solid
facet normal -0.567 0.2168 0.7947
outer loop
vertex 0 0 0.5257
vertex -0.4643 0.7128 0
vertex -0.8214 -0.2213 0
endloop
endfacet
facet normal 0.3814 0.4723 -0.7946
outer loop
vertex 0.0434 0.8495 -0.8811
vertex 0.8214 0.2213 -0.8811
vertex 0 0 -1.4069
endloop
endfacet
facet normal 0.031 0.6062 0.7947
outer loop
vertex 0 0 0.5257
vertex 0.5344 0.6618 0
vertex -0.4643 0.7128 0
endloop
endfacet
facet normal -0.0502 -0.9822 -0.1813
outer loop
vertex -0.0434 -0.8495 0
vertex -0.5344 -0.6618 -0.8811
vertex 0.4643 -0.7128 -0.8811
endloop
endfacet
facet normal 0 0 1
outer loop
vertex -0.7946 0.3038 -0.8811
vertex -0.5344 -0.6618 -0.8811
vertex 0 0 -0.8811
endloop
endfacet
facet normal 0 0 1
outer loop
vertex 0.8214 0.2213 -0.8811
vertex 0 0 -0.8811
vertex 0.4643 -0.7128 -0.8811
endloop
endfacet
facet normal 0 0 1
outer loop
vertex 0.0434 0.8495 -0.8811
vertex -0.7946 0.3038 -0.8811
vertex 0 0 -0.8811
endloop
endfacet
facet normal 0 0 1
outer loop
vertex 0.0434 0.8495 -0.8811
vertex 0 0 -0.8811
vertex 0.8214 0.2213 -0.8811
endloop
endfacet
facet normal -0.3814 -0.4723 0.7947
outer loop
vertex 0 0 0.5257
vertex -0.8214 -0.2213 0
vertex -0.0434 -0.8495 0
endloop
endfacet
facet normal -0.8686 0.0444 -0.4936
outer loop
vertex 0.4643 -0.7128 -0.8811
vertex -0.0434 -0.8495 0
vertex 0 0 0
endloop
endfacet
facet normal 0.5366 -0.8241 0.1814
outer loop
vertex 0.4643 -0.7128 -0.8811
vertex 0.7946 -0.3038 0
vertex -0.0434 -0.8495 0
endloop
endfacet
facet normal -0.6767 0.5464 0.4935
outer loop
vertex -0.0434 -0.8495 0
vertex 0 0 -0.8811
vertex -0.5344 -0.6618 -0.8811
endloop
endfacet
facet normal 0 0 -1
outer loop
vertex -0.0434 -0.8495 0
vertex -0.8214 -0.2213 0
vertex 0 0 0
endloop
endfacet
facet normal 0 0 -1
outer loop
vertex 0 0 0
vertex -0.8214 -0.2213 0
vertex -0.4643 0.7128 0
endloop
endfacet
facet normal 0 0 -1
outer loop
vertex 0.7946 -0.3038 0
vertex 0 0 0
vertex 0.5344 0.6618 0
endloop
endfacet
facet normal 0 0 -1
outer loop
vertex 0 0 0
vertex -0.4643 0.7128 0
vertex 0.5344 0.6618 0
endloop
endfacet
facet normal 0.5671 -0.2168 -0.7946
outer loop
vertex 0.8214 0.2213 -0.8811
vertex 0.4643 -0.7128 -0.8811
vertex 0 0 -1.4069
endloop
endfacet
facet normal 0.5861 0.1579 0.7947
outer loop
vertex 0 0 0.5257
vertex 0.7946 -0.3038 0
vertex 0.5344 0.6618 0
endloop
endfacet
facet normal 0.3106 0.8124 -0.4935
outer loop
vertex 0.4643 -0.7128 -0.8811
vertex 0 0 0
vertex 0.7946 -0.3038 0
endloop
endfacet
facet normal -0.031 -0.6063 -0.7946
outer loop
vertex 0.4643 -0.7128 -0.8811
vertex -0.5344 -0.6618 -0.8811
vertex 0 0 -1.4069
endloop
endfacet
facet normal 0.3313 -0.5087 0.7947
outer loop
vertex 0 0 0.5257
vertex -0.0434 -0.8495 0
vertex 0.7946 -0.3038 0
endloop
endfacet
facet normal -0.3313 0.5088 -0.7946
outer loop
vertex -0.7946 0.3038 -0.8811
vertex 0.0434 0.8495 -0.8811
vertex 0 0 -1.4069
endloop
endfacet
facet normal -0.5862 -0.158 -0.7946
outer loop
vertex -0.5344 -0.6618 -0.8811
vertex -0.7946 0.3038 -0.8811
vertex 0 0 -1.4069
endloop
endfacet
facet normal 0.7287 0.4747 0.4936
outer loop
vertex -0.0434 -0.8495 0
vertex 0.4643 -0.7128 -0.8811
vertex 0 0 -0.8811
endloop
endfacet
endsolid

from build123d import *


with BuildPart() as f3:
    # F0 (on Top) → F3 section 0
    with BuildSketch(Plane.XY, mode=Mode.PRIVATE) as f3_s0:
        Polygon((-0.821367, -0.221276), (-0.043371, -0.849544), (0.794563, -0.303772), (0.534437, 0.661803), (-0.464262, 0.712789), align=None)
    loft([f3_s0.sketch, Vertex(0, 0, 0.52573)])



with BuildPart() as f9:
    # F6 (on offset) → F9 section 0
    with BuildSketch(Plane.XY.offset(-0.88113), mode=Mode.PRIVATE) as f9_s0:
        Polygon((-0.534437, -0.661803), (0.464262, -0.712789), (0.821367, 0.221276), (0.043371, 0.849544), (-0.794563, 0.303772), align=None)
    loft([Vertex(0, 0, -1.40686), f9_s0.sketch])


with BuildPart() as f3_1:
    add(f3.part)

    add(f9.part)  # F12 merges F9
    # F11 (on face) → F12 section 0
    with BuildSketch(Plane.XY.offset(-0.88113), mode=Mode.PRIVATE) as f12_s0:
        Polygon((0.464262, -0.712789), (0, 0), (-0.534437, -0.661803), align=None)
    loft([f12_s0.sketch, Vertex(-0.043371, -0.849544, 0)])

    # F10 (on face) → F13 section 0
    with BuildSketch(Plane(origin=(0, 0, 0), x_dir=(1, 0, 0), z_dir=(0, 0, -1)), mode=Mode.PRIVATE) as f13_s0:
        Polygon((-0.043371, 0.849544), (0, 0), (0.794563, 0.303772), align=None)
    loft([f13_s0.sketch, Vertex(0.464262, -0.712789, -0.88113)])


solid = f3_1.part
